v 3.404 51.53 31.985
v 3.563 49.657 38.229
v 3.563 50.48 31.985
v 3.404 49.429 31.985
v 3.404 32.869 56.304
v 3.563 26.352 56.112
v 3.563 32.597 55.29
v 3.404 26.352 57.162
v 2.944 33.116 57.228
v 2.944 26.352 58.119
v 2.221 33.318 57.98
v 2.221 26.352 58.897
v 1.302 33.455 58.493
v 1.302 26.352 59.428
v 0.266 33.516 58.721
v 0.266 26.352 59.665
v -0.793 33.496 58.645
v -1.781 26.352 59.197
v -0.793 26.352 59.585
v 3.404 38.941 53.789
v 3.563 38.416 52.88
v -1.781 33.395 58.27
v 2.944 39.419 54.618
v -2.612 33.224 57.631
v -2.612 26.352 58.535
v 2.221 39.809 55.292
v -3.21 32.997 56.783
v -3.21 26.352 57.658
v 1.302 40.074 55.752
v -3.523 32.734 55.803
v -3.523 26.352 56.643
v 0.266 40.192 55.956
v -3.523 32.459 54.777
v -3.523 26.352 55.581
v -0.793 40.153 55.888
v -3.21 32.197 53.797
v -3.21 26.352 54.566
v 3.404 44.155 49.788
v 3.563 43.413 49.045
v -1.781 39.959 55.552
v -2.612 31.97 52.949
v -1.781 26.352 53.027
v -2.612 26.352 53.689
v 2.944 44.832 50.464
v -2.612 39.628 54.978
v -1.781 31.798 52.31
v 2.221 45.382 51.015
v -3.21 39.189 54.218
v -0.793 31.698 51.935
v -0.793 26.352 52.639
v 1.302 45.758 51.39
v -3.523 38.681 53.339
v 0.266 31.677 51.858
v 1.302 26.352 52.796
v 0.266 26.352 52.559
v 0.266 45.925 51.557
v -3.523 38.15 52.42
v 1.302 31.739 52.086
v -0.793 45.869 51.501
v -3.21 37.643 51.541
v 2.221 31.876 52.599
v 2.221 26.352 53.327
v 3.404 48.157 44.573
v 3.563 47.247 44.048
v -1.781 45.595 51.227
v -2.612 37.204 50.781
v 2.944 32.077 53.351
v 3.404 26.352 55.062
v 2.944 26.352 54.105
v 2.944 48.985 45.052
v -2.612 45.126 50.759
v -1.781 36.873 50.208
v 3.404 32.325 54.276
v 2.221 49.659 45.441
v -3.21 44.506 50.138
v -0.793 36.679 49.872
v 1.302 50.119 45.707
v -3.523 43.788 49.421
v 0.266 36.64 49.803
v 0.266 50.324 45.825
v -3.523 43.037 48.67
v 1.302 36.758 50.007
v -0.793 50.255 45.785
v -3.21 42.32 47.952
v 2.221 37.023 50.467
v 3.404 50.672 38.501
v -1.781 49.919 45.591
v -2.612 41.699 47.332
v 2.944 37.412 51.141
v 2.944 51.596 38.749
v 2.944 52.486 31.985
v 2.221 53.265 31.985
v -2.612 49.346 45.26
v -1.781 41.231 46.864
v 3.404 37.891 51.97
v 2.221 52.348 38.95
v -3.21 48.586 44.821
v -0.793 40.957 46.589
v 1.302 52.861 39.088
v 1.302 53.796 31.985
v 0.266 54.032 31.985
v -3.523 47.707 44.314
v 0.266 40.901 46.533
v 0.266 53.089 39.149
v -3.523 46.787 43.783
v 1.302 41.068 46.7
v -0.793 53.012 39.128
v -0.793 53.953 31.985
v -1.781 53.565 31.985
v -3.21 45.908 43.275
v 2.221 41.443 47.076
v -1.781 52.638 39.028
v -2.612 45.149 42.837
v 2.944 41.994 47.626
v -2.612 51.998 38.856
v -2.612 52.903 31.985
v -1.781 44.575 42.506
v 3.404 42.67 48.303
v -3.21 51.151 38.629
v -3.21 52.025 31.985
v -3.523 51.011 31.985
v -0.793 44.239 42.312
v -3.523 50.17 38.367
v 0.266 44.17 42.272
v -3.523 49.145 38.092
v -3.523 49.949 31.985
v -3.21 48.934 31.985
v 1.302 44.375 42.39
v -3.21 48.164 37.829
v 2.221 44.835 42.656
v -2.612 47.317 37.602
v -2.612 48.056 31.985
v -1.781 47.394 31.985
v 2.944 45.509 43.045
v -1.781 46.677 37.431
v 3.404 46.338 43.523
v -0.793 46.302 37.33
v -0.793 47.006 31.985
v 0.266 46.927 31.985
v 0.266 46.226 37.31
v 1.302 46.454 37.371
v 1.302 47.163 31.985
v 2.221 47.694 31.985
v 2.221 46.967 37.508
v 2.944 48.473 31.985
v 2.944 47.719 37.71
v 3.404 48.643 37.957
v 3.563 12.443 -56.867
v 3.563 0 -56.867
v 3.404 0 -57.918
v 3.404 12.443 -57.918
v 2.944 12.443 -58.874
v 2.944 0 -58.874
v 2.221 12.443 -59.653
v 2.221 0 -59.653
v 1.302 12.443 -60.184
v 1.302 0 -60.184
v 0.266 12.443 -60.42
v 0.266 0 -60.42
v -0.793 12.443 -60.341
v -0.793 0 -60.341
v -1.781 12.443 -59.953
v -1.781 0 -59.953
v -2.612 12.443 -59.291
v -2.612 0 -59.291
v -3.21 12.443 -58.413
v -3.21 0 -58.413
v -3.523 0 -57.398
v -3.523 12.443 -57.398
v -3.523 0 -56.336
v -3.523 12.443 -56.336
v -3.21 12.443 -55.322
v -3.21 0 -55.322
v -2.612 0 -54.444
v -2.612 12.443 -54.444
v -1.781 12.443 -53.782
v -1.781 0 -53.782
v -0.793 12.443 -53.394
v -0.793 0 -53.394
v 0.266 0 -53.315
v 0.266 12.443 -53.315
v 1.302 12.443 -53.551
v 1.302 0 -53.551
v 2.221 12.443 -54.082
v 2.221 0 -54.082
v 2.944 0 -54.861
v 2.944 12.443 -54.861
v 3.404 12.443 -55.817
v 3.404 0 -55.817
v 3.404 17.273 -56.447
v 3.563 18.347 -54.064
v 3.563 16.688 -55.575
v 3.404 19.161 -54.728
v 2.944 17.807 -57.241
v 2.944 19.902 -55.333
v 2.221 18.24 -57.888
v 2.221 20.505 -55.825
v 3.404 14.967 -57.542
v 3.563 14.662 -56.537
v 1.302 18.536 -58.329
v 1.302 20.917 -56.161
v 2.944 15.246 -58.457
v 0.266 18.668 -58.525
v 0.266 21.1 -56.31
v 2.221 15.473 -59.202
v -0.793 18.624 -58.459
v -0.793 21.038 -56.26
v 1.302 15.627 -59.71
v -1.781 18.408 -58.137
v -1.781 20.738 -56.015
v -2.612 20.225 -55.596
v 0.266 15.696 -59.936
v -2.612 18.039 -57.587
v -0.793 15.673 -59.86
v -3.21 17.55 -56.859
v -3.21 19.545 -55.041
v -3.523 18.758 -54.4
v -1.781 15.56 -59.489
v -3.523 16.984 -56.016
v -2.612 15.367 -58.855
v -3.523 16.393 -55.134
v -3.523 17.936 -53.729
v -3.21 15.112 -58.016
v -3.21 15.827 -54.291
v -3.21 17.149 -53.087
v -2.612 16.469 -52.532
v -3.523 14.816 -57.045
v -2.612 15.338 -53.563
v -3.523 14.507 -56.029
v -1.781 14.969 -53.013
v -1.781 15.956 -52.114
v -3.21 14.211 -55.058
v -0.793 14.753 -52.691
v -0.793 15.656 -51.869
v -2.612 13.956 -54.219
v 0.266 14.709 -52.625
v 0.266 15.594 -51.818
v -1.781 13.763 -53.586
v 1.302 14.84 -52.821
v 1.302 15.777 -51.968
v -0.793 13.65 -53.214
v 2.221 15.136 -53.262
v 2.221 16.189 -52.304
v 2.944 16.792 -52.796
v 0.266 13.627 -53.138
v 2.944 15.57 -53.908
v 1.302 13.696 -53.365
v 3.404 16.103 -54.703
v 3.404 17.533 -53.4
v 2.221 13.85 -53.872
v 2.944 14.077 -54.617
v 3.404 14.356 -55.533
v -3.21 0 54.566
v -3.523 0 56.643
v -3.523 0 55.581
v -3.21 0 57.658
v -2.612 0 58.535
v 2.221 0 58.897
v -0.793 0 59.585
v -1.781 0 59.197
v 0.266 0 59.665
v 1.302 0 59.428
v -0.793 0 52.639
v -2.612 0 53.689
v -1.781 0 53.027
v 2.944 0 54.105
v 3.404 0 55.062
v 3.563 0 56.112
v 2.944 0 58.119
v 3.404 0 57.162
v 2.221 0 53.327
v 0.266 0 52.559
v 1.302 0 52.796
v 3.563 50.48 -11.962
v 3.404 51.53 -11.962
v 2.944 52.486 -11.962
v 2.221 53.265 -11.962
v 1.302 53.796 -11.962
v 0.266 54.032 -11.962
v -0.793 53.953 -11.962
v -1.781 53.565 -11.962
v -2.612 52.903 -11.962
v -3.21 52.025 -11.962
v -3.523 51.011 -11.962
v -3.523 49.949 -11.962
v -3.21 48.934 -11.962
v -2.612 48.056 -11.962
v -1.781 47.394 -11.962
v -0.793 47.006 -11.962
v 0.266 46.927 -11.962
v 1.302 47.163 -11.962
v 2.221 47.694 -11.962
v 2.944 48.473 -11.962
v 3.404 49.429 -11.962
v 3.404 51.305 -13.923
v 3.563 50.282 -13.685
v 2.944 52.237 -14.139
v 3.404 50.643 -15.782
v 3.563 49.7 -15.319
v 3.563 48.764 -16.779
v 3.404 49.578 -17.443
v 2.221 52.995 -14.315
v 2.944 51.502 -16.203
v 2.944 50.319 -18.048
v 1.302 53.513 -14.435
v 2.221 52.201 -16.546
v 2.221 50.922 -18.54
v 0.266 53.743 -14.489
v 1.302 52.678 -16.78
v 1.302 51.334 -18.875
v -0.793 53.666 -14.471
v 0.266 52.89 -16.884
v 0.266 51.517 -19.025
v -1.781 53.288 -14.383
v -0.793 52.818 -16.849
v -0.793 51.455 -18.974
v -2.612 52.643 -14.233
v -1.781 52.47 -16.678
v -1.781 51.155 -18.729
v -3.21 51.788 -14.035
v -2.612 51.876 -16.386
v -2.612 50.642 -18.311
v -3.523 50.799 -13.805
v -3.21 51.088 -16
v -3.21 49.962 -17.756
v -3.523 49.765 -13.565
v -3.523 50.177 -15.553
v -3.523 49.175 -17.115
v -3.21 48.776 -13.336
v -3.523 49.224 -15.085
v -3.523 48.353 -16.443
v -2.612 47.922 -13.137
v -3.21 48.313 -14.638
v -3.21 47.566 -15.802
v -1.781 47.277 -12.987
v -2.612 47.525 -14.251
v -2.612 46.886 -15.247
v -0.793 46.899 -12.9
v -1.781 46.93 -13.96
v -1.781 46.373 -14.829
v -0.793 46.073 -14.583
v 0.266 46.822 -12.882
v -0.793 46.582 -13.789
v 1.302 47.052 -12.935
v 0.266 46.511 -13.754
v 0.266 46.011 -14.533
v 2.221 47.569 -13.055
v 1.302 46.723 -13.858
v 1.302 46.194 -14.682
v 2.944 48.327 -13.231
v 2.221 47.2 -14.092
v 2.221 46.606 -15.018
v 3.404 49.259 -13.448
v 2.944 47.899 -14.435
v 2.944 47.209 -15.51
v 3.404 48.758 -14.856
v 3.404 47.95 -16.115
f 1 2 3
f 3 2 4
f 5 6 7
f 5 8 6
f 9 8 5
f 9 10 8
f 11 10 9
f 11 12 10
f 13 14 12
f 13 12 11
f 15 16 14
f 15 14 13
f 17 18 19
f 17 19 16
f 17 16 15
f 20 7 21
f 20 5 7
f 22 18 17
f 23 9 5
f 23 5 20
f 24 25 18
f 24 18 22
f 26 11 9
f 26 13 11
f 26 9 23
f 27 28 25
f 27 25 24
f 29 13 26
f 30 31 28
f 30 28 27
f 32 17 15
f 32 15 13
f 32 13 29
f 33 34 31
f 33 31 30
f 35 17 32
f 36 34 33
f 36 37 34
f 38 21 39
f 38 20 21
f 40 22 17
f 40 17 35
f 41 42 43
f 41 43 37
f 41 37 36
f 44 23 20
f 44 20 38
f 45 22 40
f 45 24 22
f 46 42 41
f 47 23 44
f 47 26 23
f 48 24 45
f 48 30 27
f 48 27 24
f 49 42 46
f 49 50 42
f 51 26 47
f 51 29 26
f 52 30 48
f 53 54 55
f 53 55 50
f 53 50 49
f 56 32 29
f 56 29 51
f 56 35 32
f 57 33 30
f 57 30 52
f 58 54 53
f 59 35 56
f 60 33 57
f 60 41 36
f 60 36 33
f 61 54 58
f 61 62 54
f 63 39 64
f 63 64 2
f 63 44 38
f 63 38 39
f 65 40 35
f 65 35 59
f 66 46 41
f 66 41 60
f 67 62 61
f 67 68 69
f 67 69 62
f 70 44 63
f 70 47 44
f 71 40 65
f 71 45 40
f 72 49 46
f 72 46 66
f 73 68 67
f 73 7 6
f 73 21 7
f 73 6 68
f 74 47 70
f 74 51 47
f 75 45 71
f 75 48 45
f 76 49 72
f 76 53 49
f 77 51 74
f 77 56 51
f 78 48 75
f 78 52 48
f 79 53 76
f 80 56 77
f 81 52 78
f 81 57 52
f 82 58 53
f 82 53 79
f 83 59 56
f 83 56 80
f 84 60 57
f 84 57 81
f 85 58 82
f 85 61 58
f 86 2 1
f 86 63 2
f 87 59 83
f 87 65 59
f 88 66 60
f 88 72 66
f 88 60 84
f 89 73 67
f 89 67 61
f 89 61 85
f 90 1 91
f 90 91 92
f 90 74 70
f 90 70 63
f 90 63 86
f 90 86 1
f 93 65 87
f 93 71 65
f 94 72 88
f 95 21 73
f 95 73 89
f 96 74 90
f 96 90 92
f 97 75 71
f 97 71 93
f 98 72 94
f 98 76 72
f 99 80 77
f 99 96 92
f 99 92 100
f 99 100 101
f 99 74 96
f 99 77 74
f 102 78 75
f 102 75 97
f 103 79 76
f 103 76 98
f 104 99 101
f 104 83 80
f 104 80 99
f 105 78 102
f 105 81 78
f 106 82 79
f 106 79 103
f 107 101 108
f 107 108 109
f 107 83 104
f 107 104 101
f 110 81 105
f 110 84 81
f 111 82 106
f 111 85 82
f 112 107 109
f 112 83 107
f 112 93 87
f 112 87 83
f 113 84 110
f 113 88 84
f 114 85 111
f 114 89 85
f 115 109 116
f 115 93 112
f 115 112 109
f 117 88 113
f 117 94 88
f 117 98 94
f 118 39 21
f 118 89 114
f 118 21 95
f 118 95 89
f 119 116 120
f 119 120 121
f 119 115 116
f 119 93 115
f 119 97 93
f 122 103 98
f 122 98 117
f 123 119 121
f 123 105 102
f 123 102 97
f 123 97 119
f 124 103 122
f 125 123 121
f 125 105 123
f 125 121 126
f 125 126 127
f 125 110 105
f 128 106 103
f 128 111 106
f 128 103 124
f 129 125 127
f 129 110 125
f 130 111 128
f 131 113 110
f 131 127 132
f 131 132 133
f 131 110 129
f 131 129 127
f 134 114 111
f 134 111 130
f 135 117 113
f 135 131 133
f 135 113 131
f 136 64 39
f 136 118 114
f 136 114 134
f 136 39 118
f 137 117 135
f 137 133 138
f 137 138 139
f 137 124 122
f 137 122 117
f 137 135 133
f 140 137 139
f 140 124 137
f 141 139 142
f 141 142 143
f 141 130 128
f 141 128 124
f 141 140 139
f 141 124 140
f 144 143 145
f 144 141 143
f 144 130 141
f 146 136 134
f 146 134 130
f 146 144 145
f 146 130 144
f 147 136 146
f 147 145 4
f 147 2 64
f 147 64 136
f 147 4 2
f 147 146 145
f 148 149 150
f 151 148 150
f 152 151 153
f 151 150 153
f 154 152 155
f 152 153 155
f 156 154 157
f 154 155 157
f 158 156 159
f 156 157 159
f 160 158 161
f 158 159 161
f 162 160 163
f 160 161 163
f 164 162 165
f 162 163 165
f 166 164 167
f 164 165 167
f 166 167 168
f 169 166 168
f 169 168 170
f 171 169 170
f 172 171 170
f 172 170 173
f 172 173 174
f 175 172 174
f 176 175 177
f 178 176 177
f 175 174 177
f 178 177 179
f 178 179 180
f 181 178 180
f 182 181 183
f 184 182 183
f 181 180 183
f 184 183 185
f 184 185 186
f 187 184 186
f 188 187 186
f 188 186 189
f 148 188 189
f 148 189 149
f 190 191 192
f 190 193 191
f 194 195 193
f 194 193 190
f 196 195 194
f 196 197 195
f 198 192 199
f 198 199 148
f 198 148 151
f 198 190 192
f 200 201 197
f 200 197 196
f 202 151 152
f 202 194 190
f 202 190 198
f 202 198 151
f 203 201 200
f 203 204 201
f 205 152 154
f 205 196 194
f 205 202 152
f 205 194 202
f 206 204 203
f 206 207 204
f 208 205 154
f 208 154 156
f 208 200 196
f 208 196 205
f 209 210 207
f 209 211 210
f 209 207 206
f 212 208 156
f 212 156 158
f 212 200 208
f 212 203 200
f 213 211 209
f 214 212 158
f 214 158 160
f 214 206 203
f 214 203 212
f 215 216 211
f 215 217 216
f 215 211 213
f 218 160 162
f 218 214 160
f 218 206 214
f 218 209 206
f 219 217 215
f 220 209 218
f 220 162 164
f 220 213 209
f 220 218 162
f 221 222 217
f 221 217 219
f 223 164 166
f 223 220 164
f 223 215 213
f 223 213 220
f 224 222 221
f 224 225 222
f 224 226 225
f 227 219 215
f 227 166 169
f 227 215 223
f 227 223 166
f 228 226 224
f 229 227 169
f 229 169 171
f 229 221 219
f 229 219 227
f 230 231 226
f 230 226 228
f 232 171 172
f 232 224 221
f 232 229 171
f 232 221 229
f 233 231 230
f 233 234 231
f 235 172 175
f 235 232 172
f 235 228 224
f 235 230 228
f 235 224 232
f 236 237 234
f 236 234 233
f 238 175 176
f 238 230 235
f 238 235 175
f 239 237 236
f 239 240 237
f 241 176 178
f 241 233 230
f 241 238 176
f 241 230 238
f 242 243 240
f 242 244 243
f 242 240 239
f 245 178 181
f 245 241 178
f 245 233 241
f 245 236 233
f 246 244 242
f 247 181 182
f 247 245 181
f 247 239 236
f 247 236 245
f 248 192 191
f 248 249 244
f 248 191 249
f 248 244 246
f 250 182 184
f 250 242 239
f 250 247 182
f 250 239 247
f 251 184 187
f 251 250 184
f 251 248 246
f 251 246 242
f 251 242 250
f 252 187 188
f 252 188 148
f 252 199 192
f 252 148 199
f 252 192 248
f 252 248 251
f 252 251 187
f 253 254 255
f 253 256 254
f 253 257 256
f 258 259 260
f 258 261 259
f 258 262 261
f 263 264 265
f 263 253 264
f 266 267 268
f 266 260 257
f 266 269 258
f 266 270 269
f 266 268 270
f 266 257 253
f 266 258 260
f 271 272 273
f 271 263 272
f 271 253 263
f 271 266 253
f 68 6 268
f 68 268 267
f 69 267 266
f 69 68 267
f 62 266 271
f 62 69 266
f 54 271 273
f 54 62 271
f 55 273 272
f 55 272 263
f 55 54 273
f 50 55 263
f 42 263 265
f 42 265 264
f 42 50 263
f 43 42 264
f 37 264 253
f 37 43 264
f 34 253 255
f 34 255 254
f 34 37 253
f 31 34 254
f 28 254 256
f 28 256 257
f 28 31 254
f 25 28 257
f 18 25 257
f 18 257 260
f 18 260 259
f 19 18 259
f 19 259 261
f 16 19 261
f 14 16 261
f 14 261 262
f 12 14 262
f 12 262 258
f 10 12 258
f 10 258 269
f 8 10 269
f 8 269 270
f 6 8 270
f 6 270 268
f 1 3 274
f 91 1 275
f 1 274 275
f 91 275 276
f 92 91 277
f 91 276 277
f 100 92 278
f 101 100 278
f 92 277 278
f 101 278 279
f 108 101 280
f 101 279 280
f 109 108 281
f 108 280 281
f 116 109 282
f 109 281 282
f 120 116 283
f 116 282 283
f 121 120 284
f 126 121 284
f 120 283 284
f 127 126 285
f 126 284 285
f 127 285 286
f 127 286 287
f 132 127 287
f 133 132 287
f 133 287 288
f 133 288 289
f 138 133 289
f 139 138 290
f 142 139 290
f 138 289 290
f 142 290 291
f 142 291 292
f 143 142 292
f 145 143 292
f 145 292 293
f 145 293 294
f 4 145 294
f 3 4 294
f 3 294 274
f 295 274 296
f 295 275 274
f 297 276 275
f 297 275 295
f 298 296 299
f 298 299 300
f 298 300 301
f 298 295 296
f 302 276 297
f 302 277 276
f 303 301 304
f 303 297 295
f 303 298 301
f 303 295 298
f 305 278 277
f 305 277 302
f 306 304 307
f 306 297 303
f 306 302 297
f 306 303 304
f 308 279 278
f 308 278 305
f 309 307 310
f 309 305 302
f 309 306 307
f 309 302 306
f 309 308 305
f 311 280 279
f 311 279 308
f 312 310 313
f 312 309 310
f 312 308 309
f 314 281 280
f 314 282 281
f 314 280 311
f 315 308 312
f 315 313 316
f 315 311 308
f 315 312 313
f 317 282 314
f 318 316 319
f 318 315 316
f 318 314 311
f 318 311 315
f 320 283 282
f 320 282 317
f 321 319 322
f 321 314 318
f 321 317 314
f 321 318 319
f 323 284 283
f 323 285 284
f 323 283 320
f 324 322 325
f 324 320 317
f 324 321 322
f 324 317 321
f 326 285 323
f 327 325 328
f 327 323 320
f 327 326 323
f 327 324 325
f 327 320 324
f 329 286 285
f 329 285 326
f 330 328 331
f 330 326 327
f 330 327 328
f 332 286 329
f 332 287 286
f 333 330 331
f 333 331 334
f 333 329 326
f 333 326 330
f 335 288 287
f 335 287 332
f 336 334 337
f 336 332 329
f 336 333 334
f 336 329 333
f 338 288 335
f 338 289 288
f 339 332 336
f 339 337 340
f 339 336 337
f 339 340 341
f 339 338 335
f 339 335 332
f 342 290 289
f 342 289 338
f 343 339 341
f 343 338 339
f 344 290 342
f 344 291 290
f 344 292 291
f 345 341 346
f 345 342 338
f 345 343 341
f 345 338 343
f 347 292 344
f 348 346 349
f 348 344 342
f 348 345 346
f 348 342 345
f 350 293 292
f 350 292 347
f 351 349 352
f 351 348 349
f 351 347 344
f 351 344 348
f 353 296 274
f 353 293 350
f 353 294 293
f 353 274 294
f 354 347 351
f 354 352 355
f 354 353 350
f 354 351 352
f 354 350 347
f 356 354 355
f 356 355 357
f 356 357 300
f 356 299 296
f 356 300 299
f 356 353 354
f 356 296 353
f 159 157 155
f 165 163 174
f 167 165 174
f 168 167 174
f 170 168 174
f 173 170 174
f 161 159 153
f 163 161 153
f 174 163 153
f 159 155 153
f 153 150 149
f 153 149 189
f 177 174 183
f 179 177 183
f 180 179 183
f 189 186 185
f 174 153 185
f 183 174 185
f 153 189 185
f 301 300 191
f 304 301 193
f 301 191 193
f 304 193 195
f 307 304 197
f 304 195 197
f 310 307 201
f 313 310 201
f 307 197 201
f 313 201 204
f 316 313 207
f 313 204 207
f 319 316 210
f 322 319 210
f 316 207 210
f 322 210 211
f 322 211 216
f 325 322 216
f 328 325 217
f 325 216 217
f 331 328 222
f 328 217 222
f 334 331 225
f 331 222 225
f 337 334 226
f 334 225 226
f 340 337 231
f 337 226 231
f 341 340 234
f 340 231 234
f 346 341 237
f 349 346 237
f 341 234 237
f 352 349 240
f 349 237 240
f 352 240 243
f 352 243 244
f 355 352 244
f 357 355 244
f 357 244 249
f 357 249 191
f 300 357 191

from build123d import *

# Parameters (mm, degrees)
F1_R = 3.562666


with BuildPart() as f2:
    # F2: sweep along a path in F0
    with BuildLine(Plane.YZ) as f2_path:
        Line((0, 56.111965), (26.352271, 56.111965))
        ThreePointArc((26.352271, 56.111965), (43.41285, 49.045242), (50.479574, 31.984662))
        Line((50.479574, 31.984662), (50.479574, -11.962072))
        ThreePointArc((50.479574, -11.962072), (50.037891, -14.518664), (48.764046, -16.778877))
        Line((48.764046, -16.778877), (18.347033, -54.064252))
        ThreePointArc((18.347033, -54.064252), (15.710614, -56.131067), (12.442561, -56.867447))
        Line((12.442561, -56.867447), (0, -56.867447))
    # F1 (on Front) → F2 (sweep)
    with BuildSketch(Plane.XZ):
        with Locations((0, 56.111965)):
            Circle(F1_R)
    sweep(path=f2_path.line)


solid = f2.part
